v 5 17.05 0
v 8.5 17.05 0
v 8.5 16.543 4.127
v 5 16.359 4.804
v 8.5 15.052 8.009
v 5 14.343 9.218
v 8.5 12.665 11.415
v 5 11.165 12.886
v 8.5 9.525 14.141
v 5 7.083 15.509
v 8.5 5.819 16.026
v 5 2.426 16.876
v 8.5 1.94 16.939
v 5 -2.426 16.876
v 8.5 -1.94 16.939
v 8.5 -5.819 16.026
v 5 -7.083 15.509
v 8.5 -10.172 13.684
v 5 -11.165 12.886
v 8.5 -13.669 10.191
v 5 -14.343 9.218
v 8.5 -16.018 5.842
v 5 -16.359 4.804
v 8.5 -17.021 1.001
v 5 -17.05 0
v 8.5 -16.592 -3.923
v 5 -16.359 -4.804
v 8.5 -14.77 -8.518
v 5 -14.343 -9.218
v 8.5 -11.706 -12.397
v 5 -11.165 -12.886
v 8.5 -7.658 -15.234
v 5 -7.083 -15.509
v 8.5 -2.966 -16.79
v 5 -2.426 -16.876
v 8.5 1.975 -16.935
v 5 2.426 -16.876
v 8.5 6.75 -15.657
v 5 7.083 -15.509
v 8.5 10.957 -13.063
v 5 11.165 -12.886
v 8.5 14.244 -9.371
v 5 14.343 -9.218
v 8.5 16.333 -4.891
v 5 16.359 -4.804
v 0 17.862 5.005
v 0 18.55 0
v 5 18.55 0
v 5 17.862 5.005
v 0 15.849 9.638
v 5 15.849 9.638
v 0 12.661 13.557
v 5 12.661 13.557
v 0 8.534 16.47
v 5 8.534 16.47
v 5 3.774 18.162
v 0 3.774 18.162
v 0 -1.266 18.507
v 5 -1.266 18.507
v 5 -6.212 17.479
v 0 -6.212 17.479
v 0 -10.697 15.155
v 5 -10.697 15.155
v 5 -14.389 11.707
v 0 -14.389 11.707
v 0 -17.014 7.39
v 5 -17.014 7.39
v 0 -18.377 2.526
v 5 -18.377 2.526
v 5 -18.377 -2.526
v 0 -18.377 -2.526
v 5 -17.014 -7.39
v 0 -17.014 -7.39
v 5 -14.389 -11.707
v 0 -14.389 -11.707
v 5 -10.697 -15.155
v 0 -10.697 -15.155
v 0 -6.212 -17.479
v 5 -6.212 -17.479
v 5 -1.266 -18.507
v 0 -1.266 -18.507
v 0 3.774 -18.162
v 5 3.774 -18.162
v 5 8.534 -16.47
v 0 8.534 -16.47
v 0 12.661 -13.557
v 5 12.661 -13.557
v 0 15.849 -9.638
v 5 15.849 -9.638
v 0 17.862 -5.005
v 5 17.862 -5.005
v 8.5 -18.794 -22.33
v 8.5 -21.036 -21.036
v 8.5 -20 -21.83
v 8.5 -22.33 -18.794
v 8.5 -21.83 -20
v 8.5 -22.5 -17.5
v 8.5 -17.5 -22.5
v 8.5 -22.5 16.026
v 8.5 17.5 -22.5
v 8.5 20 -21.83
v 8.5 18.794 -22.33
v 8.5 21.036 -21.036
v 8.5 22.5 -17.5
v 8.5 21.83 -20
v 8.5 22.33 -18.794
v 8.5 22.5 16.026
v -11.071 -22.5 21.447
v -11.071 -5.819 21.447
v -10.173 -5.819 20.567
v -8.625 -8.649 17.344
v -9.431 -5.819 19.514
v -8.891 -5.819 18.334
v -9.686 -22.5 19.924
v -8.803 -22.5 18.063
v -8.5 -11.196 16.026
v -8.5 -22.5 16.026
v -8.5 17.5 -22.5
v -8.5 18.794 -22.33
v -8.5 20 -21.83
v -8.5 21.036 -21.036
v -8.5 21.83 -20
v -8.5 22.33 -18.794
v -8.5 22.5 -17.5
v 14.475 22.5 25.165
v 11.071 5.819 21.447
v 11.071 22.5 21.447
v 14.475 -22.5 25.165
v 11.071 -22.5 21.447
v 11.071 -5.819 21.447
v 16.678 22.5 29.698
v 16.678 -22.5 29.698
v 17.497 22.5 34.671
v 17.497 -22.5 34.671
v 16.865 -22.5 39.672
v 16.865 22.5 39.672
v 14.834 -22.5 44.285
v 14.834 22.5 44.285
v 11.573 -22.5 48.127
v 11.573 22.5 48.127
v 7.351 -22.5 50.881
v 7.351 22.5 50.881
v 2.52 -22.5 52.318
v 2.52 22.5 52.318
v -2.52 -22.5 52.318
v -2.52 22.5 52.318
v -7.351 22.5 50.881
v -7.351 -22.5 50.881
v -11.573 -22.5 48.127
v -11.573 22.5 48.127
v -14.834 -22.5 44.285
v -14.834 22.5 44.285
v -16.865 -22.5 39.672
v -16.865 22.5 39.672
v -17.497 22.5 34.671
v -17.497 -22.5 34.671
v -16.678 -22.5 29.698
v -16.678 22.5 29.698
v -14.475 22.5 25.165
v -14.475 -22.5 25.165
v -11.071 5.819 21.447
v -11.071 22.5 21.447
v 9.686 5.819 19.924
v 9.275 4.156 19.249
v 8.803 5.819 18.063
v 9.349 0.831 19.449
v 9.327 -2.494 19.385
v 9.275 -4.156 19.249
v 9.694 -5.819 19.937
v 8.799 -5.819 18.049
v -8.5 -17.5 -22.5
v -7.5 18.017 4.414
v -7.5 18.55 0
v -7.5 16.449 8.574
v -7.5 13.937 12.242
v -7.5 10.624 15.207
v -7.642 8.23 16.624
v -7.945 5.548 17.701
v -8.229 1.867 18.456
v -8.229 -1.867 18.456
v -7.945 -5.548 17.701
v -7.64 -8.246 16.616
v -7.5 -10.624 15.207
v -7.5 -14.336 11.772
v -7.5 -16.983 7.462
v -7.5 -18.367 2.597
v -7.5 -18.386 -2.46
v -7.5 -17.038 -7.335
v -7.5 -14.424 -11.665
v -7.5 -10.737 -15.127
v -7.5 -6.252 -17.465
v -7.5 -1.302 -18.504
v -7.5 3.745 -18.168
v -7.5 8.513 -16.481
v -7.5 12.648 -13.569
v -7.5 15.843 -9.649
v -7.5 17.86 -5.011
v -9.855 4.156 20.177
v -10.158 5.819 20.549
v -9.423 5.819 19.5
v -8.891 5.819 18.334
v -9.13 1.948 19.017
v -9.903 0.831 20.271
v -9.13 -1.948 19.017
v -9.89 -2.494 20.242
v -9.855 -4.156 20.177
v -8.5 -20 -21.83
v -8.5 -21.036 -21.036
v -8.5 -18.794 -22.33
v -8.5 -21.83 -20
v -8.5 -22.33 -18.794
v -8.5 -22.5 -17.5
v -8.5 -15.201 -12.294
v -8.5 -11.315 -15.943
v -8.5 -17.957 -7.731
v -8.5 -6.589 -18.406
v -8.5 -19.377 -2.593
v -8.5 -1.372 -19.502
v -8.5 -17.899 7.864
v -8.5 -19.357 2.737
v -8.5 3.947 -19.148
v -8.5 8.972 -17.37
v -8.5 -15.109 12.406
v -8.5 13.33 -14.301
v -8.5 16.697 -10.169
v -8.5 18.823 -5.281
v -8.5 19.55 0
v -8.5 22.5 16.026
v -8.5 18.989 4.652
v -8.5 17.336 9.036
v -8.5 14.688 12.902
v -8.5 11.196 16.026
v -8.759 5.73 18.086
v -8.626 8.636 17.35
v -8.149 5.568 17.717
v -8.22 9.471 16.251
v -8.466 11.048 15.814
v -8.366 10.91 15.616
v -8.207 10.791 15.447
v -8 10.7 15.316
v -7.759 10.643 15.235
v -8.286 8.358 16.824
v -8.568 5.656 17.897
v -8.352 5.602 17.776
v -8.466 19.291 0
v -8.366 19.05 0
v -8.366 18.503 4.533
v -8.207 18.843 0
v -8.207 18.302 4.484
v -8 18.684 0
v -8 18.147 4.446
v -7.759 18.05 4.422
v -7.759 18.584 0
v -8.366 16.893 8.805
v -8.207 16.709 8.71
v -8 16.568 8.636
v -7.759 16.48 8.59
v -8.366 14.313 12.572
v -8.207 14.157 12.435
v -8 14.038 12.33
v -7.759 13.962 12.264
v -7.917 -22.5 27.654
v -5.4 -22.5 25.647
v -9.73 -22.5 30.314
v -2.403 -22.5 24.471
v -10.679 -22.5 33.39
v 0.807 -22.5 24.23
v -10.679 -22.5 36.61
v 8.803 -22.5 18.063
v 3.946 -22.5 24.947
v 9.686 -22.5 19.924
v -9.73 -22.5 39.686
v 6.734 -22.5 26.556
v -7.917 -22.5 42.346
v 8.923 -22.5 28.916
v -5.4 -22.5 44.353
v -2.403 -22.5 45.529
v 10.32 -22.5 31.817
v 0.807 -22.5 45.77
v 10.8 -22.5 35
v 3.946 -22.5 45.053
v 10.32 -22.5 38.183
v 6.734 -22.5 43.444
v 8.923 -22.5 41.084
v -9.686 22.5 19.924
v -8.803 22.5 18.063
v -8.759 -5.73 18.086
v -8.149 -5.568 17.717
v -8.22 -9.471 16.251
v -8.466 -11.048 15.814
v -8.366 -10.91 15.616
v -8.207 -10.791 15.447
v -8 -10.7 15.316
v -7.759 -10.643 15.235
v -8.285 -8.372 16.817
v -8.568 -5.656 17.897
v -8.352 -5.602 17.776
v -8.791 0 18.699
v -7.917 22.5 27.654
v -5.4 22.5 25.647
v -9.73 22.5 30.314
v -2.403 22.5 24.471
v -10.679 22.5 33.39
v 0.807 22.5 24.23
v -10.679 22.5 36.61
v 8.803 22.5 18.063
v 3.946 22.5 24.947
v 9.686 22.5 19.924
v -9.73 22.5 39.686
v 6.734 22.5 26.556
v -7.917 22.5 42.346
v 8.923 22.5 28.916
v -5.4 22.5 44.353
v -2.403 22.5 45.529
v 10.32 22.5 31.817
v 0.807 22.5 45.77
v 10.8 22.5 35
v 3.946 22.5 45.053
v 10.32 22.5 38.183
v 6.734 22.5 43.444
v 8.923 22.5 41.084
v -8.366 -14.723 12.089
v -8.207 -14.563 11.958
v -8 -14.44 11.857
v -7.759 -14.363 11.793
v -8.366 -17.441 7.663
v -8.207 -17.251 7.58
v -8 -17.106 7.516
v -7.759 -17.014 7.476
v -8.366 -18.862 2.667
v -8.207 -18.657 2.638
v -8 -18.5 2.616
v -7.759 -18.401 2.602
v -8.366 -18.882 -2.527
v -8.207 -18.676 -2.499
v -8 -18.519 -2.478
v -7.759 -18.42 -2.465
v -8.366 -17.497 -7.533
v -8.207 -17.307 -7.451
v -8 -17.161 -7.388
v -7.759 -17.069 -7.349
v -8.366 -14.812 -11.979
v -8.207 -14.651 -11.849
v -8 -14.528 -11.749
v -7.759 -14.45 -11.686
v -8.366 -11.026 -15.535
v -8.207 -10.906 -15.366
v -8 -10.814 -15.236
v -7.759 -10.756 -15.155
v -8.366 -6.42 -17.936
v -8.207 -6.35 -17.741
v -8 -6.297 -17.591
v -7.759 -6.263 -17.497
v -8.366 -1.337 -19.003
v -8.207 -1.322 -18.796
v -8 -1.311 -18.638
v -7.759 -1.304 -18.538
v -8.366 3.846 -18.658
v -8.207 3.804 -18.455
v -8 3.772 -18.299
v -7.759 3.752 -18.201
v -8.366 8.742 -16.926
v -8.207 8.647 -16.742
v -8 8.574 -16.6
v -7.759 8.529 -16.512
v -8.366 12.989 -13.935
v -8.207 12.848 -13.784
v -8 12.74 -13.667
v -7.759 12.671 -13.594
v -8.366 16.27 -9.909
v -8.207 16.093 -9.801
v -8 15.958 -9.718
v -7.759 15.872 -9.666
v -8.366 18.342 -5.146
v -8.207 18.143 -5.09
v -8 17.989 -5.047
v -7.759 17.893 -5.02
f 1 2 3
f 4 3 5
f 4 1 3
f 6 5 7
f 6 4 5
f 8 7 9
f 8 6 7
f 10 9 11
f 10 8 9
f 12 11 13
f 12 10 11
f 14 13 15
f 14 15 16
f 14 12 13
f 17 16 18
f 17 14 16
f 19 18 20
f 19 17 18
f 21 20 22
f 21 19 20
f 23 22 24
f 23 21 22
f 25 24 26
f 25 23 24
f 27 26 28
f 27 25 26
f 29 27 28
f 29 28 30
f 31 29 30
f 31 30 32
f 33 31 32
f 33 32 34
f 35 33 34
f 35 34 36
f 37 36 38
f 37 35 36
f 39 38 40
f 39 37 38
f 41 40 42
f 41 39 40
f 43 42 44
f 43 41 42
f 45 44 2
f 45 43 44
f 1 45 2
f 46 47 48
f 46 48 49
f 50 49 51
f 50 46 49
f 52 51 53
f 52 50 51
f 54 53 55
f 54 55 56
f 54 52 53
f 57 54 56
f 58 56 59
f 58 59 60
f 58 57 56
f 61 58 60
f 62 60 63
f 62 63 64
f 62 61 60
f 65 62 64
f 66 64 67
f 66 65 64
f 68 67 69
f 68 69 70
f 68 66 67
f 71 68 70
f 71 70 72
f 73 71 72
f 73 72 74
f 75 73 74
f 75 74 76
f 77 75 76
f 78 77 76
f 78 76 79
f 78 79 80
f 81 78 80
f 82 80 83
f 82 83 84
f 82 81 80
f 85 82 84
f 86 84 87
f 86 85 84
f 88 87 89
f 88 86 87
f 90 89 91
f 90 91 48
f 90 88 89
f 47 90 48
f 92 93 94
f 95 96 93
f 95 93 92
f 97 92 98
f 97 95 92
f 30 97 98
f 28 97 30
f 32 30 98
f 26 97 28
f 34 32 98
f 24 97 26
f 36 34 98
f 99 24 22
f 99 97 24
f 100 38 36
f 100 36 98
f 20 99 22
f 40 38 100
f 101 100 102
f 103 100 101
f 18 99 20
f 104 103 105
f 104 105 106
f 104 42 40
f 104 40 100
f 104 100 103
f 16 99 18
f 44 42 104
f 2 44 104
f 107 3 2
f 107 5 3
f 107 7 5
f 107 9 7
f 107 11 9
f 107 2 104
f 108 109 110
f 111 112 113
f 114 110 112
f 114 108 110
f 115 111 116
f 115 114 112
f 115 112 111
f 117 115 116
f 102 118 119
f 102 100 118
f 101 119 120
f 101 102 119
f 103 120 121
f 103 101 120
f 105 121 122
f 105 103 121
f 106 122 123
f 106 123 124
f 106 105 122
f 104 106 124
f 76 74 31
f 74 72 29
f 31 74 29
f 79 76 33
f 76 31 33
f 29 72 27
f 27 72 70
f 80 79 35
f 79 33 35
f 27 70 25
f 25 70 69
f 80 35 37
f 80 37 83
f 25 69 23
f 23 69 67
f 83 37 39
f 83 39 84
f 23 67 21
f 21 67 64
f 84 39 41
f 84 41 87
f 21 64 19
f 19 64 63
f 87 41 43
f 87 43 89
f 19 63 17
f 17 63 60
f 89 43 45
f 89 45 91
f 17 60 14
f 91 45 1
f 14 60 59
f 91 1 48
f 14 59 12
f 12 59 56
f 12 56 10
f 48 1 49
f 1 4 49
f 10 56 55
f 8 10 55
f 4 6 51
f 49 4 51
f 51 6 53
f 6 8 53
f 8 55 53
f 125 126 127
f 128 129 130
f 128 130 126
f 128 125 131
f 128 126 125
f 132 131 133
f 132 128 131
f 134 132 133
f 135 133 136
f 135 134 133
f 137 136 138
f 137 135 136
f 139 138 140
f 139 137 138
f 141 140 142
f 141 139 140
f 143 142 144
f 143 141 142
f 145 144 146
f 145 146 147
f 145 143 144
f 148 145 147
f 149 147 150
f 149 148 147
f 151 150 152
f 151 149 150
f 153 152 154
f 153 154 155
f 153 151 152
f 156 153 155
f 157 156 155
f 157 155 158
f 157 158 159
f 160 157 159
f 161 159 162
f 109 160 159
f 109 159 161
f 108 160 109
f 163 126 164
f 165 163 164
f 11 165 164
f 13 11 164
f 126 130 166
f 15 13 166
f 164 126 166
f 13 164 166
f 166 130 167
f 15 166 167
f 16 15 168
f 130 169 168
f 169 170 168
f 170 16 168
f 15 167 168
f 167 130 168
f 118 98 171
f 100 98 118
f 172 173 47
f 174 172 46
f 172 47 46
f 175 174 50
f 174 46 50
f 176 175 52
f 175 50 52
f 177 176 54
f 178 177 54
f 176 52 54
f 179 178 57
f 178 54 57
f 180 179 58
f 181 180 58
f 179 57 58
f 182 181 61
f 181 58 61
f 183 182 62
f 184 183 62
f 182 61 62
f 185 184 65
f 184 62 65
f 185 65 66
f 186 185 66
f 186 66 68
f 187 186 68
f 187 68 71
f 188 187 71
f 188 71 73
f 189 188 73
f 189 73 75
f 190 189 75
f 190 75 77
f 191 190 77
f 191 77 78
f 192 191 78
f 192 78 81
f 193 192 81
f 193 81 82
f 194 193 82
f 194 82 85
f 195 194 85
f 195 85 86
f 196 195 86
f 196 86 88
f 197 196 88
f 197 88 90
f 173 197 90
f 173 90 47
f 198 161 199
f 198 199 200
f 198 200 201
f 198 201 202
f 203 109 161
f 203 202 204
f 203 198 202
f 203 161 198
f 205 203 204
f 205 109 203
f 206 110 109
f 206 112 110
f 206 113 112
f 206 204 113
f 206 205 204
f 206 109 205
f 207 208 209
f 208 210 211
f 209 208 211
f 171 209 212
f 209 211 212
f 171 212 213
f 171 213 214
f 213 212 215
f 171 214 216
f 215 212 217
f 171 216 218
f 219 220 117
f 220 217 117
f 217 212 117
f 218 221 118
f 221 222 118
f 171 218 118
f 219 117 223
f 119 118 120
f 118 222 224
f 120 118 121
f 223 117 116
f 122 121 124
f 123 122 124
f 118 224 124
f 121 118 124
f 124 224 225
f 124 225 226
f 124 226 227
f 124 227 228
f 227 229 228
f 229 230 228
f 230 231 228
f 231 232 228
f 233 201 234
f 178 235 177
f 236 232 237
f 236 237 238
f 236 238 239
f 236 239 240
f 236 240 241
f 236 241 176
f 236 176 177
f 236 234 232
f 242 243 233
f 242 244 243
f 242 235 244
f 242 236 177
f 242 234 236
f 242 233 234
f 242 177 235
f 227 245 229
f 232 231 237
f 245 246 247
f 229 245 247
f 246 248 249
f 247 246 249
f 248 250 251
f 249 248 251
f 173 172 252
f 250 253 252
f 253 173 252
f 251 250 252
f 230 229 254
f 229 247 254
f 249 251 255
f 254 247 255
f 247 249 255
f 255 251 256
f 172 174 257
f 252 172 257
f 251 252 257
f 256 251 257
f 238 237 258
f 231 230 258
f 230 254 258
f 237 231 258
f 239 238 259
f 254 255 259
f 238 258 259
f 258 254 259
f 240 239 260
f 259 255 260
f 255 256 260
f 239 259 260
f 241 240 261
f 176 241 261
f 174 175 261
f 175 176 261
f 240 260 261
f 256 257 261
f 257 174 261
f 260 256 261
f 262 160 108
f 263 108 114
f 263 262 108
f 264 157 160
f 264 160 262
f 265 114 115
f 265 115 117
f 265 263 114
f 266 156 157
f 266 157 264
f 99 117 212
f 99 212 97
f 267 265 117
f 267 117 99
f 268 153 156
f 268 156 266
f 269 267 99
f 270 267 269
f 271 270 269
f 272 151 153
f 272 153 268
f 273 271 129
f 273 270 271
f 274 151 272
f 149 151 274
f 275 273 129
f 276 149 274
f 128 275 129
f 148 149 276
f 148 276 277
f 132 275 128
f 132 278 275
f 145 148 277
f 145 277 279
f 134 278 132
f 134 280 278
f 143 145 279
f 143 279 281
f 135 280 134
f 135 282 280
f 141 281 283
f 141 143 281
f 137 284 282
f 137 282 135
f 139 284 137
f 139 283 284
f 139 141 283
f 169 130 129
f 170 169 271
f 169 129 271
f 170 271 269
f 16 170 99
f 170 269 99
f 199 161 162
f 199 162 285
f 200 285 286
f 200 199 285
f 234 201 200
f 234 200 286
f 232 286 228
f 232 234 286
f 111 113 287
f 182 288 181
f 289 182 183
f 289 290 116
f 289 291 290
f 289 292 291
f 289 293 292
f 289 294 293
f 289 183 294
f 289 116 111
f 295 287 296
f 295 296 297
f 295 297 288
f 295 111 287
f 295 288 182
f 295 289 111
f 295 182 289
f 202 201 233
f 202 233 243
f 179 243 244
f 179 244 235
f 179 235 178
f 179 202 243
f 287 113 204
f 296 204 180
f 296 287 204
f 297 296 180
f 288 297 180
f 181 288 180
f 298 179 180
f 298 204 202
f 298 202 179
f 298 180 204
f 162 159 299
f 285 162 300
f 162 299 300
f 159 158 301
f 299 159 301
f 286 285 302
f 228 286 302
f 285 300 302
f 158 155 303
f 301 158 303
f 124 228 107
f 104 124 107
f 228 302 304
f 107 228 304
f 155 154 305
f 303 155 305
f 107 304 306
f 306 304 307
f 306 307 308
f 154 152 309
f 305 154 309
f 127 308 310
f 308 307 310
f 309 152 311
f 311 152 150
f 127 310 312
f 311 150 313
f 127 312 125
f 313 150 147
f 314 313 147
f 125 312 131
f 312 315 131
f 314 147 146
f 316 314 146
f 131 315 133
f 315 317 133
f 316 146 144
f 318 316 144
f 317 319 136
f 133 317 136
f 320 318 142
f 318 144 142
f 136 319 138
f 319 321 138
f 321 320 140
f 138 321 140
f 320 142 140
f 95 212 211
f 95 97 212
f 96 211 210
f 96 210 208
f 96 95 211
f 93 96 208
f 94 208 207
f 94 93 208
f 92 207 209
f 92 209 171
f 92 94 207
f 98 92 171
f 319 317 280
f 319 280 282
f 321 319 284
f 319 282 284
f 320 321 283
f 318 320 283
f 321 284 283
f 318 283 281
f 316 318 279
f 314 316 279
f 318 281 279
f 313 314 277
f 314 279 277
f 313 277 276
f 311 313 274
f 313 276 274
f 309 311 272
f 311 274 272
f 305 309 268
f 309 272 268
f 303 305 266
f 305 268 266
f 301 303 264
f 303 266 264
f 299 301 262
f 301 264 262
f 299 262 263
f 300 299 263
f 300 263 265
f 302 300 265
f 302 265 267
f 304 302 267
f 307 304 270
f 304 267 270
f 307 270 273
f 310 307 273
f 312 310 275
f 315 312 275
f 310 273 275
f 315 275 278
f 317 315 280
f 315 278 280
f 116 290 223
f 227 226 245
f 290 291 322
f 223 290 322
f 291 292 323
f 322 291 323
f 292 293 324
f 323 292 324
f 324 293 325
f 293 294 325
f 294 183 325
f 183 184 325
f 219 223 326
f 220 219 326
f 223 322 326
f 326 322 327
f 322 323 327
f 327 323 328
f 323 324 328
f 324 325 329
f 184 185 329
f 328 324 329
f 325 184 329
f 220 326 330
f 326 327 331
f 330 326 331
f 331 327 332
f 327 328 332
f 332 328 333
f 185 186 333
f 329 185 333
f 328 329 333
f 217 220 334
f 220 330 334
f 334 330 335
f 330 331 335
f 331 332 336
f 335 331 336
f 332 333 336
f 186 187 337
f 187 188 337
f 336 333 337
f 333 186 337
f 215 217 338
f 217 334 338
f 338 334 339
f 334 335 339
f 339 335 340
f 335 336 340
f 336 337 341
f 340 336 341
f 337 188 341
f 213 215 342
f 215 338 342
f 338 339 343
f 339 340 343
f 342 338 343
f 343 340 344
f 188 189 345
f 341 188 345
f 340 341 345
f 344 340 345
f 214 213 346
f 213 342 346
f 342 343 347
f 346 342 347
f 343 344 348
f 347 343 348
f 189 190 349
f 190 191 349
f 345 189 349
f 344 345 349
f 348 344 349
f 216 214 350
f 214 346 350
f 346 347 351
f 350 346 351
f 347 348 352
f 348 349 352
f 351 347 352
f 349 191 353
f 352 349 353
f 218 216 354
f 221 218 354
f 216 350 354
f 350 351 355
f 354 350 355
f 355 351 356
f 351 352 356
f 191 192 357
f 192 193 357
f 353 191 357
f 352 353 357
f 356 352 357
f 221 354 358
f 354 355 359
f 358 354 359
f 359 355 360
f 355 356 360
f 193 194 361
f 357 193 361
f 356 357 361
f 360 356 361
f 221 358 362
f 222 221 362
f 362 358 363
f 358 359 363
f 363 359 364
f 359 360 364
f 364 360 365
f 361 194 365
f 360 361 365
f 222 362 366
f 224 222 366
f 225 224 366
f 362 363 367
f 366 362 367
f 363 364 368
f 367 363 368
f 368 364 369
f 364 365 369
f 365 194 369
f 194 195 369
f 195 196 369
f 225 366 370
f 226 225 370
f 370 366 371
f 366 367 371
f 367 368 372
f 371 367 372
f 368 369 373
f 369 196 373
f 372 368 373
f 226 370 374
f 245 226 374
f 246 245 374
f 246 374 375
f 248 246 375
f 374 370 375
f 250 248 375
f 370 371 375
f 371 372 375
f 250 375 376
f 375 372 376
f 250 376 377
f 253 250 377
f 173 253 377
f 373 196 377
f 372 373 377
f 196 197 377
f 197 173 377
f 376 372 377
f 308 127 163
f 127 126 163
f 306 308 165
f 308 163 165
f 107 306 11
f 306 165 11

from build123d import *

# Parameters (mm, degrees)
F0_W          = 45
F0_H          = 45
F0_R          = 18.55
F0_R_2        = 17.05
F2_DEPTH      = 8.5
F1_R          = 17.5
F1_R_2        = 10.8
F3_DEPTH      = 22.5
F4_DEPTH      = 22.5
F5_R          = 7
F6_DEPTH      = 25
F6_DEPTH_BACK = 5
F7_R          = 1
F8_R          = 5


with BuildPart() as f2:
    # F0 (on Right) → F2 (new body, symmetric)
    with BuildSketch(Plane.YZ):
        Rectangle(F0_W, F0_H)
        Circle(F0_R, mode=Mode.SUBTRACT)
        Circle(F0_R)
        Circle(F0_R_2, mode=Mode.SUBTRACT)
    extrude(amount=F2_DEPTH, both=True)

    # F1 (on Front) → F3 (join, symmetric)
    with BuildSketch(Plane.XZ):
        with Locations((0, 35)):
            Circle(F1_R)
        with Locations((0, 35)):
            Circle(F1_R_2, mode=Mode.SUBTRACT)
        with Locations((0, 35)):
            Circle(F1_R_2)
    extrude(amount=F3_DEPTH, both=True)

    # F1 (on Front) → F4 (cut, symmetric)
    with BuildSketch(Plane.XZ):
        with Locations((0, 35)):
            Circle(F1_R_2)
    extrude(amount=F4_DEPTH, both=True, mode=Mode.SUBTRACT)

    # F5
    f5_edges = [f2.edges().sort_by_distance(p)[0] for p in [
        (-8.5, 0, 19.702941),
        (8.5, 0, 19.702941),
    ]]
    fillet(f5_edges, radius=F5_R)

    # F0 (on Right) → F6 (cut, two sides)
    with BuildSketch(Plane.YZ) as f6_sk:
        Circle(F0_R)
        Circle(F0_R_2, mode=Mode.SUBTRACT)
    extrude(amount=-F6_DEPTH, mode=Mode.SUBTRACT)
    extrude(f6_sk.sketch, amount=F6_DEPTH_BACK, mode=Mode.SUBTRACT)

    # F7
    f7_edges = [f2.edges().sort_by_distance(p)[0] for p in [
        (-8.5, -9.241811, -16.083887),
        (-8.5, 16.083887, 9.241811),
        (-8.912254, 0, 18.55),
    ]]
    fillet(f7_edges, radius=F7_R)

    # F8
    f8_edges = [f2.edges().sort_by_distance(p)[0] for p in [
        (0, 22.5, -22.5),
        (0, -22.5, -22.5),
    ]]
    fillet(f8_edges, radius=F8_R)


solid = f2.part
